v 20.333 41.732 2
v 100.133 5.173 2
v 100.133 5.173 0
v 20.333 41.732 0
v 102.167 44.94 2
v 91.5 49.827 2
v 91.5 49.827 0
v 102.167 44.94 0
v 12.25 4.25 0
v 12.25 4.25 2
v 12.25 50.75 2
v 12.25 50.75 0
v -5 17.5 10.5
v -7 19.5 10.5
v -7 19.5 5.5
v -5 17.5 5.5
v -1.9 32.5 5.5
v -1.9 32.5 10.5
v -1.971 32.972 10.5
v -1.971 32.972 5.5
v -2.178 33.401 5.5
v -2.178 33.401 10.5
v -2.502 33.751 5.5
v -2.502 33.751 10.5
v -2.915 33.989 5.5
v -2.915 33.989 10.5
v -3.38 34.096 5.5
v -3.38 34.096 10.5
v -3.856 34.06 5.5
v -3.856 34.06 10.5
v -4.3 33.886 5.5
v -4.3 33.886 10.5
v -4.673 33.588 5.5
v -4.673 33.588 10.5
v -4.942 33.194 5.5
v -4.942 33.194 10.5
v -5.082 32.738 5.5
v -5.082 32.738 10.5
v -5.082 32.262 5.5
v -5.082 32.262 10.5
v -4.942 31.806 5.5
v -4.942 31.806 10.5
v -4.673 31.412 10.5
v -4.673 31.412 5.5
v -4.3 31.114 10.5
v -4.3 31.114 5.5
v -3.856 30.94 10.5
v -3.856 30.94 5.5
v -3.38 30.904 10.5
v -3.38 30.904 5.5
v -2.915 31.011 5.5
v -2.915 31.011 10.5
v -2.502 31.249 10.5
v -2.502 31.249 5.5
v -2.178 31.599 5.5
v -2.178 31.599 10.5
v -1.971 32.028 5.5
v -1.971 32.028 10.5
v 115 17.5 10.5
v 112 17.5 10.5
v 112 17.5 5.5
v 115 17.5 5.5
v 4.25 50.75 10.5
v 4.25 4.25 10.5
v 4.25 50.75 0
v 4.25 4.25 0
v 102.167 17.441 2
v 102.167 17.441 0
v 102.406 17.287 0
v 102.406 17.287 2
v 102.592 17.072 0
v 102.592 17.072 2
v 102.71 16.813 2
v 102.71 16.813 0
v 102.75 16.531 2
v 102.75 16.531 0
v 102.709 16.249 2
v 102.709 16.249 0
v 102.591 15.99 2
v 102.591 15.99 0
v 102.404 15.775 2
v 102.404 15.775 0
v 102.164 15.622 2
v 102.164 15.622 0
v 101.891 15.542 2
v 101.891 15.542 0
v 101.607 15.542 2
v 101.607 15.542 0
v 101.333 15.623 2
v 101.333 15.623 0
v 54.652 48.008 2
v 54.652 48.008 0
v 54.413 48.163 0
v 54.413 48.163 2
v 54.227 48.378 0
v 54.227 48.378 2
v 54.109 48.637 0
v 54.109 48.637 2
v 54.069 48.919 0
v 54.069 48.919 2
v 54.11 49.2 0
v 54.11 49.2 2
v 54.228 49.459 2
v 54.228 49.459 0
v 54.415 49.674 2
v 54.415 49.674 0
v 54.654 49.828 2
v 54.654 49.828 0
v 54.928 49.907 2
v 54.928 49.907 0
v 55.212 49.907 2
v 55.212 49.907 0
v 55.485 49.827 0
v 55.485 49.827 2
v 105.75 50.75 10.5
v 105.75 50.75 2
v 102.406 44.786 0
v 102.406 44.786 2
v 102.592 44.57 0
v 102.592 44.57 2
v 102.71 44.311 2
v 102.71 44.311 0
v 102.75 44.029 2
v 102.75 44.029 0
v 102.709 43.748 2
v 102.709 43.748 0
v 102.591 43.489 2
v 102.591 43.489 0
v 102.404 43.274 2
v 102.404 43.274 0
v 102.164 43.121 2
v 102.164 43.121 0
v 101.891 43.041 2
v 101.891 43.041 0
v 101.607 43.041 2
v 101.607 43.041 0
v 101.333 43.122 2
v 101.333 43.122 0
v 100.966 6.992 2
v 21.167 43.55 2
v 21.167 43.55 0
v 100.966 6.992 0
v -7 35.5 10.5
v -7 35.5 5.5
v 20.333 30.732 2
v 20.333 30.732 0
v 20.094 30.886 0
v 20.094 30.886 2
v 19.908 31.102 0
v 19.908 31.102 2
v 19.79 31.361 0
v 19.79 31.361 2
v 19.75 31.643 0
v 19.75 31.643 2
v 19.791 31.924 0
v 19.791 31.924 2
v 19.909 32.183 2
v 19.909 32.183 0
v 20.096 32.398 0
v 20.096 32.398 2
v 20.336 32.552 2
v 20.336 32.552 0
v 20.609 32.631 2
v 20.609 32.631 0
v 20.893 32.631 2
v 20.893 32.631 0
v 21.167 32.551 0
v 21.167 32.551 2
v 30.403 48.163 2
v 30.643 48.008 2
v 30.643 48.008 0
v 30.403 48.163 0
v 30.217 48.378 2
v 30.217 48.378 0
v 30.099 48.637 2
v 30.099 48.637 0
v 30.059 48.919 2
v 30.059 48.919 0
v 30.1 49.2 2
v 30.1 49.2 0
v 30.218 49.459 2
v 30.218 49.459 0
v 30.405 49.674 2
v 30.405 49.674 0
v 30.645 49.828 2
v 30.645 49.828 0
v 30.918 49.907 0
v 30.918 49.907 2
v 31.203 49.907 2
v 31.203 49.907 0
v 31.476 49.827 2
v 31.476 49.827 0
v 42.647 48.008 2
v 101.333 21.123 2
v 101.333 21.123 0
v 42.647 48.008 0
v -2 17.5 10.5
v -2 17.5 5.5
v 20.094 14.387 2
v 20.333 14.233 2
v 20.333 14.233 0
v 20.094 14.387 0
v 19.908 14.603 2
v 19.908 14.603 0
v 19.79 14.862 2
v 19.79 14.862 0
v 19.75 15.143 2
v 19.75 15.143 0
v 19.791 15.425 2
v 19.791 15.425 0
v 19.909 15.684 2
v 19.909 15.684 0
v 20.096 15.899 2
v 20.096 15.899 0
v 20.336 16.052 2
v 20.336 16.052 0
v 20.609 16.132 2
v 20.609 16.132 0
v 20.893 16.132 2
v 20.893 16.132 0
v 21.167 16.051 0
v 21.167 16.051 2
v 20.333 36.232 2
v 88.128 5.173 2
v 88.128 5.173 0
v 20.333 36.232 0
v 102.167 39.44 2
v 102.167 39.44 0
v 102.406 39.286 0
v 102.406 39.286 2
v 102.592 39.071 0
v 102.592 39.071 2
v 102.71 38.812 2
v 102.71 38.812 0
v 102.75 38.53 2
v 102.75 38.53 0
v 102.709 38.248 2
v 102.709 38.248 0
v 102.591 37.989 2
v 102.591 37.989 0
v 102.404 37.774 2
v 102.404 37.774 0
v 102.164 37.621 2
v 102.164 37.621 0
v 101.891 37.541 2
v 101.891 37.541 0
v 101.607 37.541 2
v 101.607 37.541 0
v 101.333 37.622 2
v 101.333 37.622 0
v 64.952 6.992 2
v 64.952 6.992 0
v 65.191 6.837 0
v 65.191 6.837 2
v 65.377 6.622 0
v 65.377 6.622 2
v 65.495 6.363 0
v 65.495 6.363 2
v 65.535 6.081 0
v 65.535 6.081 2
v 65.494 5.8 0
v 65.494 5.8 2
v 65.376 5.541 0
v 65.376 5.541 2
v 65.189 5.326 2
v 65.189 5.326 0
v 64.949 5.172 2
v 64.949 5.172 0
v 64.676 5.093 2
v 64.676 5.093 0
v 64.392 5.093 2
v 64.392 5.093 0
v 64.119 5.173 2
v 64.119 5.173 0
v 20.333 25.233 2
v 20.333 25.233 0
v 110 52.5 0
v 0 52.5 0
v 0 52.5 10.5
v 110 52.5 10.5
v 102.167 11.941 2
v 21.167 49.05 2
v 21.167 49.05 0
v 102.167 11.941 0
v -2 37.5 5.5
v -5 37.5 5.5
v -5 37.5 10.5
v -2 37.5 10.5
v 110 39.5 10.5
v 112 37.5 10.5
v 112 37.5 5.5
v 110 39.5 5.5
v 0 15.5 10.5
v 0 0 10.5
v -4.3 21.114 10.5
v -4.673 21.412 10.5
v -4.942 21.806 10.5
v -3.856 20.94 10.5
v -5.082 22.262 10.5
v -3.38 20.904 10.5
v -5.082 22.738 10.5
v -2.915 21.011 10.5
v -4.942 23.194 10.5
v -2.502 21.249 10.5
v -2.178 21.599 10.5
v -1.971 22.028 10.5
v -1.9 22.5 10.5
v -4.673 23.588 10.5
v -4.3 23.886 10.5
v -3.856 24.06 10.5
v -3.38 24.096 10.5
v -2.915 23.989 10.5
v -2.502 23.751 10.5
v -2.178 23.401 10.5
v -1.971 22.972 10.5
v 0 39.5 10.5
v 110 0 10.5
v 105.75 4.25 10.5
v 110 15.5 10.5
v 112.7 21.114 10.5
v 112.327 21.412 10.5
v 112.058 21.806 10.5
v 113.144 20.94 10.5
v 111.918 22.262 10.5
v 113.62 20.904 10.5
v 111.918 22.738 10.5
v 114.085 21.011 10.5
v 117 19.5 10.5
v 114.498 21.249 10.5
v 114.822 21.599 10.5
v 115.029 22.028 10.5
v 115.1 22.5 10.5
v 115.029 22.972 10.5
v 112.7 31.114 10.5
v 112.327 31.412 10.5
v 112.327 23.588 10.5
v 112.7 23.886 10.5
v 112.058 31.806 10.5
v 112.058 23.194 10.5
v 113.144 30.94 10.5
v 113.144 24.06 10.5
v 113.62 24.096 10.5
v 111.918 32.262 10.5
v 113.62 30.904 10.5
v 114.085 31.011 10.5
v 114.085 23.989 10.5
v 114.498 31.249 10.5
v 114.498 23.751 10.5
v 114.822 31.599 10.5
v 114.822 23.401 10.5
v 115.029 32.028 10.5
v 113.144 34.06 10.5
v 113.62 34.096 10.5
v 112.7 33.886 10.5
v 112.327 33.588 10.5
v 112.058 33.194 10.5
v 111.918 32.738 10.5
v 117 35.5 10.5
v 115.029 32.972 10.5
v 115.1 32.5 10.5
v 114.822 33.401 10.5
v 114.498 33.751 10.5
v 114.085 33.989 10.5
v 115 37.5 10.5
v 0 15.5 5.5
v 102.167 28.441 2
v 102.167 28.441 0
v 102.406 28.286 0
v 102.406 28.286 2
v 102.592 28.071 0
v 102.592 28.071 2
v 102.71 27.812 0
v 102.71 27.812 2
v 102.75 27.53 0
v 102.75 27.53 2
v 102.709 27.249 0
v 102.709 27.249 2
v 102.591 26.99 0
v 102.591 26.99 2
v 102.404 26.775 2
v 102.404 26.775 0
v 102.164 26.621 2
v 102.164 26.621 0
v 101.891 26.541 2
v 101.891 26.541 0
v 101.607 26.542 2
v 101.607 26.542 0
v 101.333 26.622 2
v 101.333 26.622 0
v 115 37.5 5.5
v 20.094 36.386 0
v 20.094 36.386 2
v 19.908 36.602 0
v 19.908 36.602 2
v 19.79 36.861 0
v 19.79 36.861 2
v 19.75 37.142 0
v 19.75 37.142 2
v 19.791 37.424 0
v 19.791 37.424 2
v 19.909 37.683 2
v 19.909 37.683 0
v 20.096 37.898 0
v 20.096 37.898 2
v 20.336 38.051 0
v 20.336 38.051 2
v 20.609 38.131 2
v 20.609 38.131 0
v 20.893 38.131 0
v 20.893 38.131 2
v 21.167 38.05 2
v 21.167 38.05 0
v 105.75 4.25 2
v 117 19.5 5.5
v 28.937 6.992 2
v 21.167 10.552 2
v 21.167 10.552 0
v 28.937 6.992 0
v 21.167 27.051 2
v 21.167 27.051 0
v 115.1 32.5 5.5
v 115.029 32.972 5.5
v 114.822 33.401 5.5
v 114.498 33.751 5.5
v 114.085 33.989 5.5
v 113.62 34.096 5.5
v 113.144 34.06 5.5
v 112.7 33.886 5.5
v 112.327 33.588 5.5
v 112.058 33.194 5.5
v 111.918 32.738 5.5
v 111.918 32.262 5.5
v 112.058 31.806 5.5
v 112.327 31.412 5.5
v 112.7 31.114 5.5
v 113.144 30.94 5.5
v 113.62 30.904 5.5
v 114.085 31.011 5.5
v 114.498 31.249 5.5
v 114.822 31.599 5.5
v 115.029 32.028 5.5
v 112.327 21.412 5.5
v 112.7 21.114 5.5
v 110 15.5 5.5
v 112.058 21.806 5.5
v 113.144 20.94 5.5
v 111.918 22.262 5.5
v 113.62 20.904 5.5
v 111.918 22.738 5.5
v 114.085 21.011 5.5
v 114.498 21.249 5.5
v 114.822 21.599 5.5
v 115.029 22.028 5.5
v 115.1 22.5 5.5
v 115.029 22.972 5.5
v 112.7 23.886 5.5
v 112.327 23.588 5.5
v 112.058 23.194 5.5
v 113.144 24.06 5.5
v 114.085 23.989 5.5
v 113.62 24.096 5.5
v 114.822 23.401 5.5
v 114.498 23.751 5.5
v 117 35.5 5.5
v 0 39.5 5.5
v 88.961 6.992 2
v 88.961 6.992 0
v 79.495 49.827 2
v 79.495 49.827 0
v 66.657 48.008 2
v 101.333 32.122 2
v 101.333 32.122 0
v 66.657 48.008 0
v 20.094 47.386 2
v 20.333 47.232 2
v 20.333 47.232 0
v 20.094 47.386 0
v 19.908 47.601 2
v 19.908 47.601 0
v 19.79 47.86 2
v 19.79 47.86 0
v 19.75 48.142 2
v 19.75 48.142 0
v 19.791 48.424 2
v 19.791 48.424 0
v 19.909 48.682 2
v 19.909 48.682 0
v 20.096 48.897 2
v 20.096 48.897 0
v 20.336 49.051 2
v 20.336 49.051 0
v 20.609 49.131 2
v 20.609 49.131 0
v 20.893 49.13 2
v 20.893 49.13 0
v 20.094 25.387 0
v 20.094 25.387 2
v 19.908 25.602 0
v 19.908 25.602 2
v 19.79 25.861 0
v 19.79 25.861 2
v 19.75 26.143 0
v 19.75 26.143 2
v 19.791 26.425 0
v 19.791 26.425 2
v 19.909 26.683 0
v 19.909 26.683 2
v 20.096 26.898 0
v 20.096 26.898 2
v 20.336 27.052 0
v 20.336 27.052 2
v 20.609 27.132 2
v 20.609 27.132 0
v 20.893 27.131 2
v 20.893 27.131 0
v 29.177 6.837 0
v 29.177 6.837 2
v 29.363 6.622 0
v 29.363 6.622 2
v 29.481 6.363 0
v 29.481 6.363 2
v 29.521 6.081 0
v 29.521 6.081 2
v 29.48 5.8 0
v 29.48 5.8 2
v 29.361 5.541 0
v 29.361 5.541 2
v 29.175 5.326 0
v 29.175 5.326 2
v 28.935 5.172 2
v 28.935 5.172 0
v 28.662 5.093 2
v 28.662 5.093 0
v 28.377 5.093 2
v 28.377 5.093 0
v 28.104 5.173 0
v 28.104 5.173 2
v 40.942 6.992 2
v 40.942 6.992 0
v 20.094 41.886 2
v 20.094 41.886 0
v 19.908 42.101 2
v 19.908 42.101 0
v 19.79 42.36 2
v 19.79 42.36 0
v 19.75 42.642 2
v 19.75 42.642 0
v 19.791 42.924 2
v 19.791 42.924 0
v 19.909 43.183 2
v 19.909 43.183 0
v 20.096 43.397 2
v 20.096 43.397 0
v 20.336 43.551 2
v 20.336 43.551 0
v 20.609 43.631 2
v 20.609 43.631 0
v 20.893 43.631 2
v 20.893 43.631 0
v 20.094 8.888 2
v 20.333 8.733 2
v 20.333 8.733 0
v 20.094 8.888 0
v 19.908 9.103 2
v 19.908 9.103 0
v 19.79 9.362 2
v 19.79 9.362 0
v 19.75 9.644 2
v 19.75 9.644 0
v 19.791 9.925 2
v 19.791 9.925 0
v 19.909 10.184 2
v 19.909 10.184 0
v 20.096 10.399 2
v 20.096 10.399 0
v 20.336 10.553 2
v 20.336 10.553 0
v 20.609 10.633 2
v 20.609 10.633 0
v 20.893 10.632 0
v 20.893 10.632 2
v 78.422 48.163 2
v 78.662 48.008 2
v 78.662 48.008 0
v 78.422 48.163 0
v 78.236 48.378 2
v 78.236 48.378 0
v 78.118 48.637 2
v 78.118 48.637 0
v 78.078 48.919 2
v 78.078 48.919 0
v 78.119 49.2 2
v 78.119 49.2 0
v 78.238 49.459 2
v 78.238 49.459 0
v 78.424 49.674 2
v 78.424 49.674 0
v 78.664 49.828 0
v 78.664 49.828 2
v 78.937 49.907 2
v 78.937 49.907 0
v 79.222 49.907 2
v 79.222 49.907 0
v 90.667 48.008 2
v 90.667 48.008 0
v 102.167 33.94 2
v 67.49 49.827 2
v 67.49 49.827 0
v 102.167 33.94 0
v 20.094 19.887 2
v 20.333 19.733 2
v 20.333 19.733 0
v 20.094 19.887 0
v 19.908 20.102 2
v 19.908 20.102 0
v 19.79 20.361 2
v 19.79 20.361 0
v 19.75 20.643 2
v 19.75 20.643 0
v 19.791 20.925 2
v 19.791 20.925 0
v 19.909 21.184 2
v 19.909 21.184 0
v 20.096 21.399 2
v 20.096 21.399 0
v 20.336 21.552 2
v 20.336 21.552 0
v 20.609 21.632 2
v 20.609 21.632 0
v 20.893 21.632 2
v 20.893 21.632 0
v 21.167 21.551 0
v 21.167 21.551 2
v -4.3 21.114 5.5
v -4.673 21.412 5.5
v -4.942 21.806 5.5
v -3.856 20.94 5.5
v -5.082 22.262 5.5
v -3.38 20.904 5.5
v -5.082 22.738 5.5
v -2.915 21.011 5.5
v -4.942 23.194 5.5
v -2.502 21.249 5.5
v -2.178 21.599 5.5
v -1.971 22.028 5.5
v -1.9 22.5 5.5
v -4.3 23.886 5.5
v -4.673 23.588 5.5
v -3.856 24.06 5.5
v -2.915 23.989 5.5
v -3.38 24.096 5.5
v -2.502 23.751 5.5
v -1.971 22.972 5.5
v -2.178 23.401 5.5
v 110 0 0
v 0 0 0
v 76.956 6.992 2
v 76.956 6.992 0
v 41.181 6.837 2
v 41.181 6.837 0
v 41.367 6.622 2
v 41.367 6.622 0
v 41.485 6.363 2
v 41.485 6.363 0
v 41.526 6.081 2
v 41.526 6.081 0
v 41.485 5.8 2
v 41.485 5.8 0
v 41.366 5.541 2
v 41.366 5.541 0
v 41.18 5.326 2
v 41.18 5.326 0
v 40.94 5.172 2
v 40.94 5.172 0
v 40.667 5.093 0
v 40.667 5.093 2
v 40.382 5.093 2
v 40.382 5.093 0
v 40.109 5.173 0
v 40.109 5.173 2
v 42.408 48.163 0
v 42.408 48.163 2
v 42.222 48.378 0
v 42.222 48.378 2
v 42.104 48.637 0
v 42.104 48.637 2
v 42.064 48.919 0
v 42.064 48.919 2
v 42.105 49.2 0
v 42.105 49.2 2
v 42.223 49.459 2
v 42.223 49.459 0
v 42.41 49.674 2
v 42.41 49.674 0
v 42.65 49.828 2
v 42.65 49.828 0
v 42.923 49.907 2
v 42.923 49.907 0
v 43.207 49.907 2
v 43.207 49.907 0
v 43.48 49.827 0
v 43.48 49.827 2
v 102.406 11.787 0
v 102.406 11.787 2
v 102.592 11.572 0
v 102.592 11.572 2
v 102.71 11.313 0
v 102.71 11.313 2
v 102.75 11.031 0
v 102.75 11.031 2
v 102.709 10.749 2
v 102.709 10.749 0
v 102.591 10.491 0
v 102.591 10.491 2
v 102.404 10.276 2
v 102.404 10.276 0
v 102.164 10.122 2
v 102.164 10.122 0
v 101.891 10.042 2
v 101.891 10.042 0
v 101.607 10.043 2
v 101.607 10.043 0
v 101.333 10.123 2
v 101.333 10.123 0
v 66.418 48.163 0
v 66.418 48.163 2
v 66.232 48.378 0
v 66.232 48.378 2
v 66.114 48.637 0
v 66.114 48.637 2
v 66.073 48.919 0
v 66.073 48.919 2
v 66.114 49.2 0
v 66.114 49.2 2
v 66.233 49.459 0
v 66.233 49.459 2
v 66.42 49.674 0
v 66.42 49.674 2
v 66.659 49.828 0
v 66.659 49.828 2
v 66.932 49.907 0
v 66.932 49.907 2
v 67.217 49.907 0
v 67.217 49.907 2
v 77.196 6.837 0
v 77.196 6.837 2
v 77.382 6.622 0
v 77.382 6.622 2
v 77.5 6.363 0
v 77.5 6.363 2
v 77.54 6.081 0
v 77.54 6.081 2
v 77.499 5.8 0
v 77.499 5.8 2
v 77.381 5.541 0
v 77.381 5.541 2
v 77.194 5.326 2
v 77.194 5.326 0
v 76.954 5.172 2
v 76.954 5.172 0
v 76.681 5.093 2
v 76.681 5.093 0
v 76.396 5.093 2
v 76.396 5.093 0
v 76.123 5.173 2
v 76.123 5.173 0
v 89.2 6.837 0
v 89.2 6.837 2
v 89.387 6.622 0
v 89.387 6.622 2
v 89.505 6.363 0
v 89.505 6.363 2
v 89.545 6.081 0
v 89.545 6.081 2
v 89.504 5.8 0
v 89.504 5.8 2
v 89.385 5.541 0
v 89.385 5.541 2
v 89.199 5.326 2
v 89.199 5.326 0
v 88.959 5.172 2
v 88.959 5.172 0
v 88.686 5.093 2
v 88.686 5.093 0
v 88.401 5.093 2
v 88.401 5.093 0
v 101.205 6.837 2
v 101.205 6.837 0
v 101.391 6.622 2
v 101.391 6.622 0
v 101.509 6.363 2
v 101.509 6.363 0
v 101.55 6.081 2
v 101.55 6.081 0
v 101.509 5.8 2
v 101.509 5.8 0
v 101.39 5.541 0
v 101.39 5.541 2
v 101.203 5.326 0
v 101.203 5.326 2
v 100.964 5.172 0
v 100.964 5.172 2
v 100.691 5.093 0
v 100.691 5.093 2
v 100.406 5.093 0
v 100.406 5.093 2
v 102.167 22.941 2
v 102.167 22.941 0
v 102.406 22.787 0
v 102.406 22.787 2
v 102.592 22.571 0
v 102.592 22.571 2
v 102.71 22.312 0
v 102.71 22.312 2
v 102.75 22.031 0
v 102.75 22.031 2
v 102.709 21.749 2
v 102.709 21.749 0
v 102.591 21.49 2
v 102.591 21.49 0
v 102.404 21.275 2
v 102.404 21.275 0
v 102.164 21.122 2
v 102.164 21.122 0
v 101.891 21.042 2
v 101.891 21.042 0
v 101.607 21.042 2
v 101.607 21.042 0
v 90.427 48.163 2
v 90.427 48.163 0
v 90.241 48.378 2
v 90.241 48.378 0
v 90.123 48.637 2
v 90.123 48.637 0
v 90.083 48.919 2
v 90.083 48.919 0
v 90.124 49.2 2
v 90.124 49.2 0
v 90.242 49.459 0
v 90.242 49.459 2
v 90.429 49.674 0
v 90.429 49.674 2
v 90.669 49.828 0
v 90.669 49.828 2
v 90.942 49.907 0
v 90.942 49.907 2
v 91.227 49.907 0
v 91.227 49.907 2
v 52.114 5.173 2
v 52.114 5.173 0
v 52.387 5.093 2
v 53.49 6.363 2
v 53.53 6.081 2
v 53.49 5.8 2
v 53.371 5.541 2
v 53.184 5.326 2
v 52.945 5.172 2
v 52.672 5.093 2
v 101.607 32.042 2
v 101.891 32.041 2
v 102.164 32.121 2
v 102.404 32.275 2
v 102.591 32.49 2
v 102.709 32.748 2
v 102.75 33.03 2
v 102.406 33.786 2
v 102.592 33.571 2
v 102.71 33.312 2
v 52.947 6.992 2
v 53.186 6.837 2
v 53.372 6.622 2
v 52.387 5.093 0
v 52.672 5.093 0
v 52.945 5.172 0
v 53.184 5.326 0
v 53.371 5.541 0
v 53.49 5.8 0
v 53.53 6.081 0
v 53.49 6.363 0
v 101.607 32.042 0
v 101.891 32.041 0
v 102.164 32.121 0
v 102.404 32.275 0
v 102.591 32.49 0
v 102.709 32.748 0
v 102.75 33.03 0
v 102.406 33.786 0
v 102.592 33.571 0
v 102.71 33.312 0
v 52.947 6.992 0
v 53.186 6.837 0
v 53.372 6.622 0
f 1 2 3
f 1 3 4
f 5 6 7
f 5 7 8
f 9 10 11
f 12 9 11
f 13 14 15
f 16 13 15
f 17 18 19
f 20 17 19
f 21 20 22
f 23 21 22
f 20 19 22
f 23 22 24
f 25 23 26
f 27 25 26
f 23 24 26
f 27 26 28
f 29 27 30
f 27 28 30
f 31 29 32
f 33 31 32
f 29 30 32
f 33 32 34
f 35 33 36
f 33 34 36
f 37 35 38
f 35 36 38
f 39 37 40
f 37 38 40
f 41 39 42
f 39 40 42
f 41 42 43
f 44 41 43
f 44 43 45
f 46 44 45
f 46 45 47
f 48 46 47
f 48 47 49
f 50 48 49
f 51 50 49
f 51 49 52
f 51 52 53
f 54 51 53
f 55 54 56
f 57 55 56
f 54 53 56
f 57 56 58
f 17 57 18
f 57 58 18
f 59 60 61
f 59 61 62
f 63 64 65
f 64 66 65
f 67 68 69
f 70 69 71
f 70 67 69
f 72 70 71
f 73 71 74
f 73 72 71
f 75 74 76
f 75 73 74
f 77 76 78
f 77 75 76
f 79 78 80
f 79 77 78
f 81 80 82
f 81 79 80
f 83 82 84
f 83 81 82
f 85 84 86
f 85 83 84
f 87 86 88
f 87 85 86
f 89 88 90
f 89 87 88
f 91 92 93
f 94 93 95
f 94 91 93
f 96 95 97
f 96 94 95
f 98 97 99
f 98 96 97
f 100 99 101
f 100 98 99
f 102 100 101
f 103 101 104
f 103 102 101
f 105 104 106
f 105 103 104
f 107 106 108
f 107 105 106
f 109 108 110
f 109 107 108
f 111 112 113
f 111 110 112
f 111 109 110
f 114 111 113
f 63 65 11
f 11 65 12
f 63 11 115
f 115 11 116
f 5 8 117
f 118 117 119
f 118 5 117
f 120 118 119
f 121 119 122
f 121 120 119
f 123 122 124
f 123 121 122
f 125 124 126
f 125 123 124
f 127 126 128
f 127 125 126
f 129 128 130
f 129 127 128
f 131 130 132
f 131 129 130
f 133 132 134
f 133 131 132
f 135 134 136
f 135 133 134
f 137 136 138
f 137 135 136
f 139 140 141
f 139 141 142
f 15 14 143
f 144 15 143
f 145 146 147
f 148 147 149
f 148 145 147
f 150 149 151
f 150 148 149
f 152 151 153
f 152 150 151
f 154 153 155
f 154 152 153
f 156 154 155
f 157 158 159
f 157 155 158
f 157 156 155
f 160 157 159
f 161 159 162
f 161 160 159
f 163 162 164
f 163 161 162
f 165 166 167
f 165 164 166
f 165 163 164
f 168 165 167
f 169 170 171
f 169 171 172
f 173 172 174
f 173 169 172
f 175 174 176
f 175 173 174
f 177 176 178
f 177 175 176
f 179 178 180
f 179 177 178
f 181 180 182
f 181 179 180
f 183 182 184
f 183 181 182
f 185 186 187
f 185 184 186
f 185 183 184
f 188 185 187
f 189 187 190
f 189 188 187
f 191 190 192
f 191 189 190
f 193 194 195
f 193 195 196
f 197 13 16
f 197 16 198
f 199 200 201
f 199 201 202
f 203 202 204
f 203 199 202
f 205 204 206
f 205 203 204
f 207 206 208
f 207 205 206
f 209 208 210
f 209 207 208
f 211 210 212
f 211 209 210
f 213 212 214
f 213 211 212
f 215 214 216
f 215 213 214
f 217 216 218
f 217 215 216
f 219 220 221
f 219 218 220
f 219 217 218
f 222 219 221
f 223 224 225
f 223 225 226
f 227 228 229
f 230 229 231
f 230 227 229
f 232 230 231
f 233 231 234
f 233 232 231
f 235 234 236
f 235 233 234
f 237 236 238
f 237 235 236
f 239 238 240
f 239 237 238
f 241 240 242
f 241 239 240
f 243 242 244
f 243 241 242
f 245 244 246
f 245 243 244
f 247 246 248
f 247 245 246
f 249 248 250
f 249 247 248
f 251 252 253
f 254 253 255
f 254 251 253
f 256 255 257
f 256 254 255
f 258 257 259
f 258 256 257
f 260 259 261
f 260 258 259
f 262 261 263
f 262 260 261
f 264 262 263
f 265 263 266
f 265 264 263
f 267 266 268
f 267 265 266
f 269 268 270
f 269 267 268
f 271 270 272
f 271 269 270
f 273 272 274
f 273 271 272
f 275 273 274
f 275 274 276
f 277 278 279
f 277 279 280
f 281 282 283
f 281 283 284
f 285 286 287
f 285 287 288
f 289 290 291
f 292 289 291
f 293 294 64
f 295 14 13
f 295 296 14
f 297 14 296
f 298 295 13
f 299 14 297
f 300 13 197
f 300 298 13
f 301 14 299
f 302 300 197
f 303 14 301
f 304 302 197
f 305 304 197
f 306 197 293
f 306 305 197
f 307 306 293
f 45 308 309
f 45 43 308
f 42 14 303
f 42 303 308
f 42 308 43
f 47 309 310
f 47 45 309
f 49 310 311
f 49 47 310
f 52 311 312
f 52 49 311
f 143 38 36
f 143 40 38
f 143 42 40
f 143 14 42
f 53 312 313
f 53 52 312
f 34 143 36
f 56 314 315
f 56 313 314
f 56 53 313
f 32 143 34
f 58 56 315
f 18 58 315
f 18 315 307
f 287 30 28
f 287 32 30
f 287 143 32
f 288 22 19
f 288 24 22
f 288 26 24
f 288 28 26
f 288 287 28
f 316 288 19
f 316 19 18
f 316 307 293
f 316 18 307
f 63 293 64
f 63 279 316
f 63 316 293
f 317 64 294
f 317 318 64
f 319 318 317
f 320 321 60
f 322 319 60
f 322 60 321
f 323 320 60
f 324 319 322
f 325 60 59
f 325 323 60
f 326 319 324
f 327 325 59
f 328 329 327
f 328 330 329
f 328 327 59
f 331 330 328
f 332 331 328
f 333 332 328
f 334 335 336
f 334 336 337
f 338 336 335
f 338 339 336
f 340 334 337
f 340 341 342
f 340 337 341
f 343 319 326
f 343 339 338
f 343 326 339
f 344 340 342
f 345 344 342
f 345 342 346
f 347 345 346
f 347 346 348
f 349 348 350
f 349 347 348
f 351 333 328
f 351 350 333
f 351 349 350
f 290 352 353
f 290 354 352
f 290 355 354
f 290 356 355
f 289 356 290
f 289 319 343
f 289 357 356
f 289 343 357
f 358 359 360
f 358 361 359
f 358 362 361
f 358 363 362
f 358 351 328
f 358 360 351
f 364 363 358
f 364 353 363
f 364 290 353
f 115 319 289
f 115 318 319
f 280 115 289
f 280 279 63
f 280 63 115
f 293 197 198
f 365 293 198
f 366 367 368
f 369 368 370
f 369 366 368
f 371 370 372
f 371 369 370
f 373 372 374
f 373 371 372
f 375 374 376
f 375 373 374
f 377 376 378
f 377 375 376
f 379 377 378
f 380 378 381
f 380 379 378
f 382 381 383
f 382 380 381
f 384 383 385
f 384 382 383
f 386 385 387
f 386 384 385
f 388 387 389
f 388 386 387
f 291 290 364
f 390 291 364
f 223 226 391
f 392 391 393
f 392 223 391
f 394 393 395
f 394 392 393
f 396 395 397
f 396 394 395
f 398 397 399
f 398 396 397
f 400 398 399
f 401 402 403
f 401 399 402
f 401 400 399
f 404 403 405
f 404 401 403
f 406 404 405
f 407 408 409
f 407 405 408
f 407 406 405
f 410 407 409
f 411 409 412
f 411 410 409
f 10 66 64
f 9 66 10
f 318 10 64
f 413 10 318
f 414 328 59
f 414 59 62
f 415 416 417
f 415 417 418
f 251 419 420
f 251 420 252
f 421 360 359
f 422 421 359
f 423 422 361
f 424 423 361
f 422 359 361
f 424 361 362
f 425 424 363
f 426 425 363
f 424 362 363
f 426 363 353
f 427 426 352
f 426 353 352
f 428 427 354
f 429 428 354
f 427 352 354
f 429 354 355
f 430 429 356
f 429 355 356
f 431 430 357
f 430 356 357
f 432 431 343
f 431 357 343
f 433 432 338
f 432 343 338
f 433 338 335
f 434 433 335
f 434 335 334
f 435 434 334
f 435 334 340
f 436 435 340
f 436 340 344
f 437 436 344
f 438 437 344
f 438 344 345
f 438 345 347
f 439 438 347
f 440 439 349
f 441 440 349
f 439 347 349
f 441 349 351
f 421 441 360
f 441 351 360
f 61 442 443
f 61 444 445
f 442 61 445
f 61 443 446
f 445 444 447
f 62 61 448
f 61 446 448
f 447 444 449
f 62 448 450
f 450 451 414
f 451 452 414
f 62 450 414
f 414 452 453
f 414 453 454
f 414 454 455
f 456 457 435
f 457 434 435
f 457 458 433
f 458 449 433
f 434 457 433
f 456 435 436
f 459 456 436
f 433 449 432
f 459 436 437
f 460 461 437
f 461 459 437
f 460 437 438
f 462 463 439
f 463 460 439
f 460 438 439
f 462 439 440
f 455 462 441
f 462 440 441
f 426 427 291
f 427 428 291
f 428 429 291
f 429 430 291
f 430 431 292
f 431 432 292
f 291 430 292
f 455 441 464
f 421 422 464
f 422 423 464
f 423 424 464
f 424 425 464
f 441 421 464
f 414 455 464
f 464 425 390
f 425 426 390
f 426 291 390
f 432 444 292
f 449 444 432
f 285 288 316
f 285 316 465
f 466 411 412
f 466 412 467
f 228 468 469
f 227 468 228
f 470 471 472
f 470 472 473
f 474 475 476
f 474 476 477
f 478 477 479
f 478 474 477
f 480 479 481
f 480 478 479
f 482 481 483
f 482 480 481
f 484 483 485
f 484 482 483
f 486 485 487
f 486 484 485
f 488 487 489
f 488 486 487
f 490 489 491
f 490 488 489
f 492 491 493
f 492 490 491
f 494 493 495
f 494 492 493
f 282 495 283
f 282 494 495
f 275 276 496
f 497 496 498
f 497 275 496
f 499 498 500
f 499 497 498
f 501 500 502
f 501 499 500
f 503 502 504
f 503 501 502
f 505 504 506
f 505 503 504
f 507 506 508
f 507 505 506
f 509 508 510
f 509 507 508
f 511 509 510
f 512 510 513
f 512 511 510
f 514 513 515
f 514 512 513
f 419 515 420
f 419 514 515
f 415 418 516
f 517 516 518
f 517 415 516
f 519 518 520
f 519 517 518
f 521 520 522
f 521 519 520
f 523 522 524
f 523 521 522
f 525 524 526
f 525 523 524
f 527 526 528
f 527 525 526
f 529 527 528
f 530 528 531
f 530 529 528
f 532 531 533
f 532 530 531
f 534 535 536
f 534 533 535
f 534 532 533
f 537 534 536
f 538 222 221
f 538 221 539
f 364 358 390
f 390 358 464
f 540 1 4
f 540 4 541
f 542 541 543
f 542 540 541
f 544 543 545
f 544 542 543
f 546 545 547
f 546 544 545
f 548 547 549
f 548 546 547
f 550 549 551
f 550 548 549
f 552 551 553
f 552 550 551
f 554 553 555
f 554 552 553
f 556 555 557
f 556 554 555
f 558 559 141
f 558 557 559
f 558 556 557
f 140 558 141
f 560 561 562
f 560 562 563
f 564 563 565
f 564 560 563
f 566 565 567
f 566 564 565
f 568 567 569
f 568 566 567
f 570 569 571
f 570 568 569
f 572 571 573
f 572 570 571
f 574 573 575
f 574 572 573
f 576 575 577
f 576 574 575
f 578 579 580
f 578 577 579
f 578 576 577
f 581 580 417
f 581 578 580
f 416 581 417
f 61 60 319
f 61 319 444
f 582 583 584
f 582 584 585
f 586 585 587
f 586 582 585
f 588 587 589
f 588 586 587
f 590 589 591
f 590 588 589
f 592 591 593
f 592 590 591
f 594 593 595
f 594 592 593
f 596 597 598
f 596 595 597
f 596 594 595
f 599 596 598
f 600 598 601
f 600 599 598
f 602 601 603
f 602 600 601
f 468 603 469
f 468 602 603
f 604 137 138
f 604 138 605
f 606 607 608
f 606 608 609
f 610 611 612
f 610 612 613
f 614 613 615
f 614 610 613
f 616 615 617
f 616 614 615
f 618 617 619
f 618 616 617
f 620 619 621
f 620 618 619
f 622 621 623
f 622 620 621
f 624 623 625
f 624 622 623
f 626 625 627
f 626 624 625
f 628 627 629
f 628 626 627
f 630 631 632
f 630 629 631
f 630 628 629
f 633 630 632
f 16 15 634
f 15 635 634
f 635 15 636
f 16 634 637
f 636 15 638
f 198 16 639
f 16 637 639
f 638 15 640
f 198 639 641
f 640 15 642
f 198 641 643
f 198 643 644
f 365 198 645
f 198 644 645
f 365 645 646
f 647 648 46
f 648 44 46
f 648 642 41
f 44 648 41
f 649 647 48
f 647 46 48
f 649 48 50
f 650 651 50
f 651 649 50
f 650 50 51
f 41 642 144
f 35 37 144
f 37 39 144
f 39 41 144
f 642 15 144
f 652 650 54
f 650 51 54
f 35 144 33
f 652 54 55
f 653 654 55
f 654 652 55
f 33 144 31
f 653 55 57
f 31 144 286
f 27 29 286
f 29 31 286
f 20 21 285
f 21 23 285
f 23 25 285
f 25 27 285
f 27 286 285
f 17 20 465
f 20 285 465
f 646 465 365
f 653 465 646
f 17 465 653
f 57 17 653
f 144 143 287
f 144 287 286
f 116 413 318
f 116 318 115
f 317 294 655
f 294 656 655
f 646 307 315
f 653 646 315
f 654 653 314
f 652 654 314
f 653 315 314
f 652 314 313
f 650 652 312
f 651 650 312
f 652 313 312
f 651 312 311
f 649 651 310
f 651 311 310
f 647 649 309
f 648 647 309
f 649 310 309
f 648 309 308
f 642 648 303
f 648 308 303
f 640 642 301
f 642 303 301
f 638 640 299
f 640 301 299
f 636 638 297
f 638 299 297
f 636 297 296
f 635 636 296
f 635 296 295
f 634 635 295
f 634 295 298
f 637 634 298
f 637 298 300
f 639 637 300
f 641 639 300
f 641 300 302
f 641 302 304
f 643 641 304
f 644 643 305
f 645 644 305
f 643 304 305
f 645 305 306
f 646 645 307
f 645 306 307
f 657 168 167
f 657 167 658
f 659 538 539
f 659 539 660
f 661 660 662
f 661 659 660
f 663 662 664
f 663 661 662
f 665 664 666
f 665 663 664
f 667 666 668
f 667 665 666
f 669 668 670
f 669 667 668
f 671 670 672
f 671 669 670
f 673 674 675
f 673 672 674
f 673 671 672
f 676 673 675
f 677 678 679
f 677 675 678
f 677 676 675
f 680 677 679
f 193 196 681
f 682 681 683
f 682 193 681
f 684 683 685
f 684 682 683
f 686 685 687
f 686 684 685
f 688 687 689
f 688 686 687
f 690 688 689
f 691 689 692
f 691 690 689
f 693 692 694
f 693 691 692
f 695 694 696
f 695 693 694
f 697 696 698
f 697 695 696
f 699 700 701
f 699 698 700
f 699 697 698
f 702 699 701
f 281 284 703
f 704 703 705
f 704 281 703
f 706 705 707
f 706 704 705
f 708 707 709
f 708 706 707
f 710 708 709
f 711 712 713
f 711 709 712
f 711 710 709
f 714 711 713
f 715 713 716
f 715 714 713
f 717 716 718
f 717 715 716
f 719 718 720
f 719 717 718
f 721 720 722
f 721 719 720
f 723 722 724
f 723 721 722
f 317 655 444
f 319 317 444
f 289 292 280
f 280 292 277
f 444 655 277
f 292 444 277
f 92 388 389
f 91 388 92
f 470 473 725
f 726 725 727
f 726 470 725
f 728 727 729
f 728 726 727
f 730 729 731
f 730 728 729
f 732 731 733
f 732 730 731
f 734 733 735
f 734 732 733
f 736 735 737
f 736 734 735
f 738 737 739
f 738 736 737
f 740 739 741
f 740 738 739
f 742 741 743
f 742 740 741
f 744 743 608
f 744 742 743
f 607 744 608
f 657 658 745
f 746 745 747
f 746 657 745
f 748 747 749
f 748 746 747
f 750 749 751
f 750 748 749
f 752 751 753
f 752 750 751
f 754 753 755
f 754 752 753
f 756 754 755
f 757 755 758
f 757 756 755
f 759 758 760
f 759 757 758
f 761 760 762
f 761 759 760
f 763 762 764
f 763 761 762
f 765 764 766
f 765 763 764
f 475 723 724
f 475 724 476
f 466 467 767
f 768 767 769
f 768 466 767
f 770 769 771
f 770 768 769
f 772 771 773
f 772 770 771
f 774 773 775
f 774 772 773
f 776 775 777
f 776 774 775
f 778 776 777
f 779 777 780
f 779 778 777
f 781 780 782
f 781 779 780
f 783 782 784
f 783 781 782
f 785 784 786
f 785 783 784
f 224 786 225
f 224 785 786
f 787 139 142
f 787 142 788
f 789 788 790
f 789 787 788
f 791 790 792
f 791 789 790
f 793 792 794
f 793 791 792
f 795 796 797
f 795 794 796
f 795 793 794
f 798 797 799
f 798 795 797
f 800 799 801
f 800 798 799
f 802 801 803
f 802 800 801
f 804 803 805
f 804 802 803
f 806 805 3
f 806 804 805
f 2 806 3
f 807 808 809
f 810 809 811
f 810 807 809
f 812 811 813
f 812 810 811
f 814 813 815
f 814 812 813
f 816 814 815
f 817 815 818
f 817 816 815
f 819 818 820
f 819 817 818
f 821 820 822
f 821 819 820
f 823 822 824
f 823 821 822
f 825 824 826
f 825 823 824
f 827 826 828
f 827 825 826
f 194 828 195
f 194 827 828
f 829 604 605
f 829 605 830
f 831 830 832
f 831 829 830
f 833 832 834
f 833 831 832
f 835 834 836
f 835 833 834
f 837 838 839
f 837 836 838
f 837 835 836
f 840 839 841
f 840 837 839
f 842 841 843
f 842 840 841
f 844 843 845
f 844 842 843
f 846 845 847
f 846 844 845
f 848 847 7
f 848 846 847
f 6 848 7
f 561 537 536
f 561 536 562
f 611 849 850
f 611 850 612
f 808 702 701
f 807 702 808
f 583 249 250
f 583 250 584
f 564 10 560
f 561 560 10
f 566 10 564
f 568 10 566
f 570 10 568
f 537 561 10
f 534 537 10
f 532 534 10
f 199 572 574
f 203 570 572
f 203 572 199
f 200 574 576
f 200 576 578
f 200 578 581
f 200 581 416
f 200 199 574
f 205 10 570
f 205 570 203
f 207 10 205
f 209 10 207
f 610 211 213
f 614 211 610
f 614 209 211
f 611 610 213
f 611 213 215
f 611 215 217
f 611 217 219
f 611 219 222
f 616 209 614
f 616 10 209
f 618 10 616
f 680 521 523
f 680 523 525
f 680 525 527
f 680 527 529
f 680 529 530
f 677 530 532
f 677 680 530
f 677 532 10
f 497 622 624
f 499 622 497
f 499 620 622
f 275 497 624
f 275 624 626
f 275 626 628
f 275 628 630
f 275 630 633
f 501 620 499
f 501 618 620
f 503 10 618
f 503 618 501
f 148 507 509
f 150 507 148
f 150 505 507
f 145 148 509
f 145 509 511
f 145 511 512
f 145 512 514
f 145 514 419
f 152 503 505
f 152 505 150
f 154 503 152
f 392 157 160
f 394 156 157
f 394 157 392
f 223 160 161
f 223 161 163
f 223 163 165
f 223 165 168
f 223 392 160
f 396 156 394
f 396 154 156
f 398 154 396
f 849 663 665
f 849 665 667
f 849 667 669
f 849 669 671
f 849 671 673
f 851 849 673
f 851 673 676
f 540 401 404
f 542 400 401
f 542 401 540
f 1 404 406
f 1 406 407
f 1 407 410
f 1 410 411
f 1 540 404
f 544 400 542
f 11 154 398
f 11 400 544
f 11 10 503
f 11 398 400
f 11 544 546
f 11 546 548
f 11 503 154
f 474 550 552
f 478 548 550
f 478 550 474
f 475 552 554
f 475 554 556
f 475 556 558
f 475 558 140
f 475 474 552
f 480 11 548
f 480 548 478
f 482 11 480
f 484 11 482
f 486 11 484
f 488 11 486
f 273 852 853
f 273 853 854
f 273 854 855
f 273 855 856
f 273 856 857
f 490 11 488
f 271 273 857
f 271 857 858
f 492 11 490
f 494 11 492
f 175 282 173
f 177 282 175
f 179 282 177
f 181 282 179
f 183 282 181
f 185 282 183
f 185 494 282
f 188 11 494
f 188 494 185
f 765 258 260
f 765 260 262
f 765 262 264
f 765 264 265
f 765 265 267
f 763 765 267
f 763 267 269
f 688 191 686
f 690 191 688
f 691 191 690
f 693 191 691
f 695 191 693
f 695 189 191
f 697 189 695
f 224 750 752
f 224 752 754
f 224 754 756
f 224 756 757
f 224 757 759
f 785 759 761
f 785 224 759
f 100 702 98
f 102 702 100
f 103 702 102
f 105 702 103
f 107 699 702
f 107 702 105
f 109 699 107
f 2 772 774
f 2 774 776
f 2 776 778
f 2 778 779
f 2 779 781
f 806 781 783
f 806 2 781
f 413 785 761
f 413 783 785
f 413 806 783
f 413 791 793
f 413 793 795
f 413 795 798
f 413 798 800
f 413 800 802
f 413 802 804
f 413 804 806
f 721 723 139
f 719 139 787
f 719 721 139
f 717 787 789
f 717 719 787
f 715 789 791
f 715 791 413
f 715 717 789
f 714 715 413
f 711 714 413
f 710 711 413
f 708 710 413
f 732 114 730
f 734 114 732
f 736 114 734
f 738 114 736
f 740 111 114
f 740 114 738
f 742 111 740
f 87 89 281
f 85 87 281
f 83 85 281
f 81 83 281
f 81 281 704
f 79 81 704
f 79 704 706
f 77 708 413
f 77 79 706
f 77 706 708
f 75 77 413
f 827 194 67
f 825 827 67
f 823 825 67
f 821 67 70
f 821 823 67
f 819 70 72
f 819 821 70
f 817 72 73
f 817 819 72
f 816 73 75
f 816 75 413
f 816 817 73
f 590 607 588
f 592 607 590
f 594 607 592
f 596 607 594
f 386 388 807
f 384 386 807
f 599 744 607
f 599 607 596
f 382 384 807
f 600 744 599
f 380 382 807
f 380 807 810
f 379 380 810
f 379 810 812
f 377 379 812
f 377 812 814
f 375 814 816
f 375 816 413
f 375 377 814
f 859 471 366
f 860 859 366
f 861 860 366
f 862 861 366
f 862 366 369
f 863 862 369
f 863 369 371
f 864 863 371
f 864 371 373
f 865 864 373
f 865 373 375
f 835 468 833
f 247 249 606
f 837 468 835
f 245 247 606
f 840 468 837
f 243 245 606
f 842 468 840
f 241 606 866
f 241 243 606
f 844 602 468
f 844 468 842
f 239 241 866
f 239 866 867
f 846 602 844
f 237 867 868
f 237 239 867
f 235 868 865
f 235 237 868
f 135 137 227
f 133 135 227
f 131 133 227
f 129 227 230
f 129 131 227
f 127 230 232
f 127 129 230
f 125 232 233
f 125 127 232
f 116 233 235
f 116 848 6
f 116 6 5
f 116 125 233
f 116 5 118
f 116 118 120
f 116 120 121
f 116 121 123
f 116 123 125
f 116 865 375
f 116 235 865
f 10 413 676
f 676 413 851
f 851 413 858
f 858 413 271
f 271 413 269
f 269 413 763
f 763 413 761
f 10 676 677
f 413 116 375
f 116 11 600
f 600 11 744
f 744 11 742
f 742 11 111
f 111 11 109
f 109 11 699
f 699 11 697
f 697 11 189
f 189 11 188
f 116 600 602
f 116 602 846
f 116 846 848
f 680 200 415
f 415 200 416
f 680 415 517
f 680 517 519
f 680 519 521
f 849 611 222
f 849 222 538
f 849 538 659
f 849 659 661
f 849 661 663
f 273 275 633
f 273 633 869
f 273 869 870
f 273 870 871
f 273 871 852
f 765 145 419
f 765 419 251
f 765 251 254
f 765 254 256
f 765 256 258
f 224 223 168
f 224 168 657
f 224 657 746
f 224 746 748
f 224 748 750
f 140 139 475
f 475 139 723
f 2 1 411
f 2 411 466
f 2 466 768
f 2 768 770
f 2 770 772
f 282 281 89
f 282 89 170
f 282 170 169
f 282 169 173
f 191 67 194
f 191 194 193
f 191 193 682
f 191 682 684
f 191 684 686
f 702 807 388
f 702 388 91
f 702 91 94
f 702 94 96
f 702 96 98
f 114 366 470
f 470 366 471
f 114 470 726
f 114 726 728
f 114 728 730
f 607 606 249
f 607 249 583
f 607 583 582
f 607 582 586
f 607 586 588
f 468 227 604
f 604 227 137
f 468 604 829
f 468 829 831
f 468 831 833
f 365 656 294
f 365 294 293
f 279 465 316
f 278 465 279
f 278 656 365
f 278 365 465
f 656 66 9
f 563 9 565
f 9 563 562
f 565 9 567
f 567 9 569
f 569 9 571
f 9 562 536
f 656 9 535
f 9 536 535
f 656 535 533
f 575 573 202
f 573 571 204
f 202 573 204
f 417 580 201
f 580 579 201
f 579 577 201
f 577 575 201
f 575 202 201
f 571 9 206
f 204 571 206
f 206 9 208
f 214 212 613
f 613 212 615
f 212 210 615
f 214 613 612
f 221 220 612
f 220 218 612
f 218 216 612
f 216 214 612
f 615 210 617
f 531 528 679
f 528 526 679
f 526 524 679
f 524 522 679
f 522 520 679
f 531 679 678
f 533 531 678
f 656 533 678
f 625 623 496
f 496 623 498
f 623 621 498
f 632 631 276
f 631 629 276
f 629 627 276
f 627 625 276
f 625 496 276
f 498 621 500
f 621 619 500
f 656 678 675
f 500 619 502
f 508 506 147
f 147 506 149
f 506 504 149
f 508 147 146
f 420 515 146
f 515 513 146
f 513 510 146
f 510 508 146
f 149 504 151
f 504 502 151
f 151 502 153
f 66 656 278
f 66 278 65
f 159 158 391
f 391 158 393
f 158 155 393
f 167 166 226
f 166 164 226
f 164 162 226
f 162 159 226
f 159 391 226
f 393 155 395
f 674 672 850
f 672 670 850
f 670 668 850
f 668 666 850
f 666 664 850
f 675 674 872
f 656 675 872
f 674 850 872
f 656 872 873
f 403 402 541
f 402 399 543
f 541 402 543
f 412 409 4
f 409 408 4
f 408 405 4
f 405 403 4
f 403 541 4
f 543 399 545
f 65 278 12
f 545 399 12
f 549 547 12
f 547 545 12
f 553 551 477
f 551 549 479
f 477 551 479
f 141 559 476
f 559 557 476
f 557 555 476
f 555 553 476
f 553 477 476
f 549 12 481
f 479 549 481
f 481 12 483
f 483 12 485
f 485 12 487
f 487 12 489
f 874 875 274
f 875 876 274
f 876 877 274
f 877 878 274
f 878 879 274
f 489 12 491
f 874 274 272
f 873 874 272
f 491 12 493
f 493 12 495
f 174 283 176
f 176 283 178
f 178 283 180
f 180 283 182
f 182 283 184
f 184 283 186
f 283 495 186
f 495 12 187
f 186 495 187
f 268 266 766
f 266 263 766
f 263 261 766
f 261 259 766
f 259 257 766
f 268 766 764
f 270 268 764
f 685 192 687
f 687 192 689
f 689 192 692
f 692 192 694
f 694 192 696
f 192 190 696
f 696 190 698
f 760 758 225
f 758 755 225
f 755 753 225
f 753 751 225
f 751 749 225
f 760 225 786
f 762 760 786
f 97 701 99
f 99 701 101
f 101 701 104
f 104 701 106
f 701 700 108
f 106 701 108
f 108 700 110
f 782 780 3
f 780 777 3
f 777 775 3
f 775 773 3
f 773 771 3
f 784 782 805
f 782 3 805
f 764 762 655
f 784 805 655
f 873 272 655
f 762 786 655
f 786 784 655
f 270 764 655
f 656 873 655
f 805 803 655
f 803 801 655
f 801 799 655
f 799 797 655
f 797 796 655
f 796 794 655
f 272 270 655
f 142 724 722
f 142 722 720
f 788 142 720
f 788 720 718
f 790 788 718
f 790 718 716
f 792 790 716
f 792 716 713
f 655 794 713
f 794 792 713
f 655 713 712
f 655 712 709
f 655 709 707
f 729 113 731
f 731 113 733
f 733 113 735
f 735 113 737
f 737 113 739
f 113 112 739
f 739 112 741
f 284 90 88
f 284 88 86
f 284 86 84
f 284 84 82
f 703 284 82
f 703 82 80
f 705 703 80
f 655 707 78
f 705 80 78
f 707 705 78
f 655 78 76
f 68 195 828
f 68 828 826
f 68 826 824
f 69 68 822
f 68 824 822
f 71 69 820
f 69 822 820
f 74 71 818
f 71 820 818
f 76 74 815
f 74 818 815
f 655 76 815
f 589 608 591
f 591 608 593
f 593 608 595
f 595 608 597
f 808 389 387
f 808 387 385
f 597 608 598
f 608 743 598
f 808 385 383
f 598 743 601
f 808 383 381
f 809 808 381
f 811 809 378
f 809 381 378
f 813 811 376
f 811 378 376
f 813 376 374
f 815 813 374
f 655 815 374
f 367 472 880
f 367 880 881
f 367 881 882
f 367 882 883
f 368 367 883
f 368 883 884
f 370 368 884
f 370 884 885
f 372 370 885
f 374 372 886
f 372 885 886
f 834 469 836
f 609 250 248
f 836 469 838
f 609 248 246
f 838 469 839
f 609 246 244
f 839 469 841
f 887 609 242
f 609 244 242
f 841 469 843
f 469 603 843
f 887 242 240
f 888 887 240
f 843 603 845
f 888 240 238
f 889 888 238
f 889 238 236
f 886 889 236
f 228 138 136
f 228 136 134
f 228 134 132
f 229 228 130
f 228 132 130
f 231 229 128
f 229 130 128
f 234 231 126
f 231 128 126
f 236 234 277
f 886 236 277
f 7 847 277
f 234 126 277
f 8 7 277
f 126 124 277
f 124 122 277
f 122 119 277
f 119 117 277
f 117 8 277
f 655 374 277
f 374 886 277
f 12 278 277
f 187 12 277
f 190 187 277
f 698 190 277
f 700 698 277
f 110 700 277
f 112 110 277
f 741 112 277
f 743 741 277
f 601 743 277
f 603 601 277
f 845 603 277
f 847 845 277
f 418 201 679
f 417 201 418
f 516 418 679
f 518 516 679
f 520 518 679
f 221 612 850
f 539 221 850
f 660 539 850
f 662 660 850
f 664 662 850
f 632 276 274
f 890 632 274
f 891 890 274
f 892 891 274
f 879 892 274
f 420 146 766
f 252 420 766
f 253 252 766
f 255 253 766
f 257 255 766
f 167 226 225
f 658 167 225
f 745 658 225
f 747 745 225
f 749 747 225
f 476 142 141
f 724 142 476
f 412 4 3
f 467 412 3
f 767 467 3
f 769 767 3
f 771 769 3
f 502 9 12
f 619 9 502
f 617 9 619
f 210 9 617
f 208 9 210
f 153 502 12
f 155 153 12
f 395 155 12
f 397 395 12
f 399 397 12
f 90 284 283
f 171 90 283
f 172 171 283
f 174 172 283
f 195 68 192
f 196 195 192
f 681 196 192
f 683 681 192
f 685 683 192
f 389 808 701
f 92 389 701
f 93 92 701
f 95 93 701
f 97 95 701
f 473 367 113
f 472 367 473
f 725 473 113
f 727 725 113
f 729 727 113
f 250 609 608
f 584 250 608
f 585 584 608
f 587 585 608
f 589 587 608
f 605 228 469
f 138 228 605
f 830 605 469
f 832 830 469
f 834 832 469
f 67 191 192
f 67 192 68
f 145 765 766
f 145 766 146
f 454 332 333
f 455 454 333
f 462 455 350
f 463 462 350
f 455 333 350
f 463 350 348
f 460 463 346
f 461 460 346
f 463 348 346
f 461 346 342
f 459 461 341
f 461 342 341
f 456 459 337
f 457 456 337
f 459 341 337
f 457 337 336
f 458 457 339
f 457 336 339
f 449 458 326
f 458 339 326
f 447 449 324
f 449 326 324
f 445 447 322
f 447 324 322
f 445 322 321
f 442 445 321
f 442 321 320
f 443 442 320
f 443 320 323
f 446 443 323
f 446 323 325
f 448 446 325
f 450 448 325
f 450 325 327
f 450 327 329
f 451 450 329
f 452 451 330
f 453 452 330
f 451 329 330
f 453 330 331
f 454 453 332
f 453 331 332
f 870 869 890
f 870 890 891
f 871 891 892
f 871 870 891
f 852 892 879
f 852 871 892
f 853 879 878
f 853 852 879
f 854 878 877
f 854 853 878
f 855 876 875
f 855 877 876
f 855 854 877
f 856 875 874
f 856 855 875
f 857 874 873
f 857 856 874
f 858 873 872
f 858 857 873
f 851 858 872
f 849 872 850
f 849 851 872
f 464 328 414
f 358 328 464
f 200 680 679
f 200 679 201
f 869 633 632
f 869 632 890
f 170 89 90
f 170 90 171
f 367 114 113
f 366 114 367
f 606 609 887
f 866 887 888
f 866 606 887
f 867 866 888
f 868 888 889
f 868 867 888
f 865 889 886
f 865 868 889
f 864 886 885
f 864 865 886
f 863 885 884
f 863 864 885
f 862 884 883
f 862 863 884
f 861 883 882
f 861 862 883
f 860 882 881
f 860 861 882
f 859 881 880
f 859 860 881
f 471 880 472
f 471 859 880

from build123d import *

# Parameters (mm, degrees)
SKETCH_1_W          = 110
SKETCH_1_H          = 52.5
EXTRUDE_1_DEPTH     = 2
SKETCH_2_W          = 110
SKETCH_2_H          = 52.5
SKETCH_2_W_2        = 101.5
SKETCH_2_H_2        = 46.5
EXTRUDE_2_DEPTH     = 8.5
CUT_EXTRUDE_1_DEPTH = 3
SKETCH_5_W          = 8
SKETCH_5_H          = 46.5
CUT_EXTRUDE_2_DEPTH = 3
SKETCH_6_W          = 7
SKETCH_6_H          = 20
SKETCH_6_R          = 1.6
EXTRUDE_3_DEPTH     = 5
CHAMFER_1_SIZE      = 2


with BuildPart() as part:
    # 草图1 → 凸台-拉伸1 (new body)
    with BuildSketch(Plane.XY):
        with Locations((55, 26.25)):
            Rectangle(SKETCH_1_W, SKETCH_1_H)
    extrude(amount=EXTRUDE_1_DEPTH)

    # 草图2 → 凸台-拉伸2 (add)
    with BuildSketch(Plane.XY.offset(2)):
        with Locations((55, 26.25)):
            Rectangle(SKETCH_2_W, SKETCH_2_H)
        with Locations((55, 27.5)):
            Rectangle(SKETCH_2_W_2, SKETCH_2_H_2, mode=Mode.SUBTRACT)
    extrude(amount=EXTRUDE_2_DEPTH)

    # 草图3 → 切除-拉伸1 (cut, through all)
    with BuildSketch(Plane.XY.offset(2)):
        with BuildLine():
            Line((21.166500495, 10.551667335), (28.937295815, 6.991647804))
            ThreePointArc((28.937295815, 6.991647804), (29.429930809, 5.66601182), (28.104294825, 5.173376826))
            Line((28.104294825, 5.173376826), (20.333499505, 8.733396357))
            ThreePointArc((20.333499505, 8.733396357), (19.840864511, 10.059032341), (21.166500495, 10.551667335))
        make_face()
        with BuildLine():
            Line((91.499535297, 49.826623174), (102.166500495, 44.939786901))
            ThreePointArc((102.166500495, 44.939786901), (102.659135489, 43.614150917), (101.333499505, 43.121515923))
            Line((101.333499505, 43.121515923), (90.666534307, 48.008352196))
            ThreePointArc((90.666534307, 48.008352196), (90.173899313, 49.33398818), (91.499535297, 49.826623174))
        make_face()
        with BuildLine():
            Line((21.166500495, 16.051397639), (40.942083467, 6.991647804))
            ThreePointArc((40.942083467, 6.991647804), (41.434718462, 5.66601182), (40.109082477, 5.173376826))
            Line((40.109082477, 5.173376826), (20.333499505, 14.233126661))
            ThreePointArc((20.333499505, 14.233126661), (19.840864511, 15.558762645), (21.166500495, 16.051397639))
        make_face()
        with BuildLine():
            Line((21.166500495, 21.551127943), (52.94687112, 6.991647804))
            ThreePointArc((52.94687112, 6.991647804), (53.439506114, 5.66601182), (52.11387013, 5.173376826))
            Line((52.11387013, 5.173376826), (20.333499505, 19.732856965))
            ThreePointArc((20.333499505, 19.732856965), (19.840864511, 21.058492949), (21.166500495, 21.551127943))
        make_face()
        with BuildLine():
            Line((21.166500495, 32.550588551), (76.956446425, 6.991647804))
            ThreePointArc((76.956446425, 6.991647804), (77.449081419, 5.66601182), (76.123445435, 5.173376826))
            Line((76.123445435, 5.173376826), (20.333499505, 30.732317572))
            ThreePointArc((20.333499505, 30.732317572), (19.840864511, 32.057953556), (21.166500495, 32.550588551))
        make_face()
        with BuildLine():
            Line((21.166500495, 27.050858247), (64.951658772, 6.991647804))
            ThreePointArc((64.951658772, 6.991647804), (65.444293766, 5.66601182), (64.118657782, 5.173376826))
            Line((64.118657782, 5.173376826), (20.333499505, 25.232587268))
            ThreePointArc((20.333499505, 25.232587268), (19.840864511, 26.558223253), (21.166500495, 27.050858247))
        make_face()
        with BuildLine():
            Line((21.166500495, 38.050318854), (88.961234077, 6.991647804))
            ThreePointArc((88.961234077, 6.991647804), (89.453869071, 5.66601182), (88.128233087, 5.173376826))
            Line((88.128233087, 5.173376826), (20.333499505, 36.232047876))
            ThreePointArc((20.333499505, 36.232047876), (19.840864511, 37.55768386), (21.166500495, 38.050318854))
        make_face()
        with BuildLine():
            Line((21.166500495, 43.550049158), (100.96602173, 6.991647804))
            ThreePointArc((100.96602173, 6.991647804), (101.458656724, 5.66601182), (100.13302074, 5.173376826))
            Line((100.13302074, 5.173376826), (20.333499505, 41.73177818))
            ThreePointArc((20.333499505, 41.73177818), (19.840864511, 43.057414164), (21.166500495, 43.550049158))
        make_face()
        with BuildLine():
            Line((21.166500495, 49.049779462), (102.166500495, 11.941405078))
            ThreePointArc((102.166500495, 11.941405078), (102.659135489, 10.615769094), (101.333499505, 10.1231341))
            Line((101.333499505, 10.1231341), (20.333499505, 47.231508484))
            ThreePointArc((20.333499505, 47.231508484), (19.840864511, 48.557144468), (21.166500495, 49.049779462))
        make_face()
        with BuildLine():
            Line((31.475597035, 49.826623174), (102.166500495, 17.441135382))
            ThreePointArc((102.166500495, 17.441135382), (102.659135489, 16.115499398), (101.333499505, 15.622864403))
            Line((101.333499505, 15.622864403), (30.642596045, 48.008352196))
            ThreePointArc((30.642596045, 48.008352196), (30.149961051, 49.33398818), (31.475597035, 49.826623174))
        make_face()
        with BuildLine():
            Line((43.480384687, 49.826623174), (102.166500495, 22.940865686))
            ThreePointArc((102.166500495, 22.940865686), (102.659135489, 21.615229701), (101.333499505, 21.122594707))
            Line((101.333499505, 21.122594707), (42.647383697, 48.008352196))
            ThreePointArc((42.647383697, 48.008352196), (42.154748703, 49.33398818), (43.480384687, 49.826623174))
        make_face()
        with BuildLine():
            Line((55.48517234, 49.826623174), (102.166500495, 28.440595989))
            ThreePointArc((102.166500495, 28.440595989), (102.659135489, 27.114960005), (101.333499505, 26.622325011))
            Line((101.333499505, 26.622325011), (54.65217135, 48.008352196))
            ThreePointArc((54.65217135, 48.008352196), (54.159536356, 49.33398818), (55.48517234, 49.826623174))
        make_face()
        with BuildLine():
            Line((67.489959992, 49.826623174), (102.166500495, 33.940326293))
            ThreePointArc((102.166500495, 33.940326293), (102.659135489, 32.614690309), (101.333499505, 32.122055315))
            Line((101.333499505, 32.122055315), (66.656959002, 48.008352196))
            ThreePointArc((66.656959002, 48.008352196), (66.164324008, 49.33398818), (67.489959992, 49.826623174))
        make_face()
        with BuildLine():
            Line((79.494747645, 49.826623174), (102.166500495, 39.440056597))
            ThreePointArc((102.166500495, 39.440056597), (102.659135489, 38.114420613), (101.333499505, 37.621785619))
            Line((101.333499505, 37.621785619), (78.661746655, 48.008352196))
            ThreePointArc((78.661746655, 48.008352196), (78.16911166, 49.33398818), (79.494747645, 49.826623174))
        make_face()
    extrude(amount=-CUT_EXTRUDE_1_DEPTH, mode=Mode.SUBTRACT)

    # 草图5 → 切除-拉伸2 (cut, through all)
    with BuildSketch(Plane.XY.offset(2)):
        with Locations((8.25, 27.5)):
            Rectangle(SKETCH_5_W, SKETCH_5_H)
    extrude(amount=-CUT_EXTRUDE_2_DEPTH, mode=Mode.SUBTRACT)

    # 草图6 → 凸台-拉伸3 (add)
    with BuildSketch(Plane.XY.offset(10.5)):
        with Locations((113.5, 27.5)):
            Rectangle(SKETCH_6_W, SKETCH_6_H)
        with Locations((113.5, 32.5)):
            Circle(SKETCH_6_R, mode=Mode.SUBTRACT)
        with Locations((113.5, 22.5)):
            Circle(SKETCH_6_R, mode=Mode.SUBTRACT)
        with Locations((-3.5, 27.5)):
            Rectangle(SKETCH_6_W, SKETCH_6_H)
        with Locations((-3.5, 22.5)):
            Circle(SKETCH_6_R, mode=Mode.SUBTRACT)
        with Locations((-3.5, 32.5)):
            Circle(SKETCH_6_R, mode=Mode.SUBTRACT)
    extrude(amount=-EXTRUDE_3_DEPTH)

    # 倒角1
    chamfer_1_edges = [part.edges().sort_by_distance(p)[0] for p in [
        (110, 17.5, 8),
        (110, 37.5, 8),
        (117, 37.5, 8),
        (117, 17.5, 8),
        (0, 37.5, 8),
        (0, 17.5, 8),
        (-7, 17.5, 8),
        (-7, 37.5, 8),
    ]]
    chamfer(chamfer_1_edges, length=CHAMFER_1_SIZE)


solid = part.part
